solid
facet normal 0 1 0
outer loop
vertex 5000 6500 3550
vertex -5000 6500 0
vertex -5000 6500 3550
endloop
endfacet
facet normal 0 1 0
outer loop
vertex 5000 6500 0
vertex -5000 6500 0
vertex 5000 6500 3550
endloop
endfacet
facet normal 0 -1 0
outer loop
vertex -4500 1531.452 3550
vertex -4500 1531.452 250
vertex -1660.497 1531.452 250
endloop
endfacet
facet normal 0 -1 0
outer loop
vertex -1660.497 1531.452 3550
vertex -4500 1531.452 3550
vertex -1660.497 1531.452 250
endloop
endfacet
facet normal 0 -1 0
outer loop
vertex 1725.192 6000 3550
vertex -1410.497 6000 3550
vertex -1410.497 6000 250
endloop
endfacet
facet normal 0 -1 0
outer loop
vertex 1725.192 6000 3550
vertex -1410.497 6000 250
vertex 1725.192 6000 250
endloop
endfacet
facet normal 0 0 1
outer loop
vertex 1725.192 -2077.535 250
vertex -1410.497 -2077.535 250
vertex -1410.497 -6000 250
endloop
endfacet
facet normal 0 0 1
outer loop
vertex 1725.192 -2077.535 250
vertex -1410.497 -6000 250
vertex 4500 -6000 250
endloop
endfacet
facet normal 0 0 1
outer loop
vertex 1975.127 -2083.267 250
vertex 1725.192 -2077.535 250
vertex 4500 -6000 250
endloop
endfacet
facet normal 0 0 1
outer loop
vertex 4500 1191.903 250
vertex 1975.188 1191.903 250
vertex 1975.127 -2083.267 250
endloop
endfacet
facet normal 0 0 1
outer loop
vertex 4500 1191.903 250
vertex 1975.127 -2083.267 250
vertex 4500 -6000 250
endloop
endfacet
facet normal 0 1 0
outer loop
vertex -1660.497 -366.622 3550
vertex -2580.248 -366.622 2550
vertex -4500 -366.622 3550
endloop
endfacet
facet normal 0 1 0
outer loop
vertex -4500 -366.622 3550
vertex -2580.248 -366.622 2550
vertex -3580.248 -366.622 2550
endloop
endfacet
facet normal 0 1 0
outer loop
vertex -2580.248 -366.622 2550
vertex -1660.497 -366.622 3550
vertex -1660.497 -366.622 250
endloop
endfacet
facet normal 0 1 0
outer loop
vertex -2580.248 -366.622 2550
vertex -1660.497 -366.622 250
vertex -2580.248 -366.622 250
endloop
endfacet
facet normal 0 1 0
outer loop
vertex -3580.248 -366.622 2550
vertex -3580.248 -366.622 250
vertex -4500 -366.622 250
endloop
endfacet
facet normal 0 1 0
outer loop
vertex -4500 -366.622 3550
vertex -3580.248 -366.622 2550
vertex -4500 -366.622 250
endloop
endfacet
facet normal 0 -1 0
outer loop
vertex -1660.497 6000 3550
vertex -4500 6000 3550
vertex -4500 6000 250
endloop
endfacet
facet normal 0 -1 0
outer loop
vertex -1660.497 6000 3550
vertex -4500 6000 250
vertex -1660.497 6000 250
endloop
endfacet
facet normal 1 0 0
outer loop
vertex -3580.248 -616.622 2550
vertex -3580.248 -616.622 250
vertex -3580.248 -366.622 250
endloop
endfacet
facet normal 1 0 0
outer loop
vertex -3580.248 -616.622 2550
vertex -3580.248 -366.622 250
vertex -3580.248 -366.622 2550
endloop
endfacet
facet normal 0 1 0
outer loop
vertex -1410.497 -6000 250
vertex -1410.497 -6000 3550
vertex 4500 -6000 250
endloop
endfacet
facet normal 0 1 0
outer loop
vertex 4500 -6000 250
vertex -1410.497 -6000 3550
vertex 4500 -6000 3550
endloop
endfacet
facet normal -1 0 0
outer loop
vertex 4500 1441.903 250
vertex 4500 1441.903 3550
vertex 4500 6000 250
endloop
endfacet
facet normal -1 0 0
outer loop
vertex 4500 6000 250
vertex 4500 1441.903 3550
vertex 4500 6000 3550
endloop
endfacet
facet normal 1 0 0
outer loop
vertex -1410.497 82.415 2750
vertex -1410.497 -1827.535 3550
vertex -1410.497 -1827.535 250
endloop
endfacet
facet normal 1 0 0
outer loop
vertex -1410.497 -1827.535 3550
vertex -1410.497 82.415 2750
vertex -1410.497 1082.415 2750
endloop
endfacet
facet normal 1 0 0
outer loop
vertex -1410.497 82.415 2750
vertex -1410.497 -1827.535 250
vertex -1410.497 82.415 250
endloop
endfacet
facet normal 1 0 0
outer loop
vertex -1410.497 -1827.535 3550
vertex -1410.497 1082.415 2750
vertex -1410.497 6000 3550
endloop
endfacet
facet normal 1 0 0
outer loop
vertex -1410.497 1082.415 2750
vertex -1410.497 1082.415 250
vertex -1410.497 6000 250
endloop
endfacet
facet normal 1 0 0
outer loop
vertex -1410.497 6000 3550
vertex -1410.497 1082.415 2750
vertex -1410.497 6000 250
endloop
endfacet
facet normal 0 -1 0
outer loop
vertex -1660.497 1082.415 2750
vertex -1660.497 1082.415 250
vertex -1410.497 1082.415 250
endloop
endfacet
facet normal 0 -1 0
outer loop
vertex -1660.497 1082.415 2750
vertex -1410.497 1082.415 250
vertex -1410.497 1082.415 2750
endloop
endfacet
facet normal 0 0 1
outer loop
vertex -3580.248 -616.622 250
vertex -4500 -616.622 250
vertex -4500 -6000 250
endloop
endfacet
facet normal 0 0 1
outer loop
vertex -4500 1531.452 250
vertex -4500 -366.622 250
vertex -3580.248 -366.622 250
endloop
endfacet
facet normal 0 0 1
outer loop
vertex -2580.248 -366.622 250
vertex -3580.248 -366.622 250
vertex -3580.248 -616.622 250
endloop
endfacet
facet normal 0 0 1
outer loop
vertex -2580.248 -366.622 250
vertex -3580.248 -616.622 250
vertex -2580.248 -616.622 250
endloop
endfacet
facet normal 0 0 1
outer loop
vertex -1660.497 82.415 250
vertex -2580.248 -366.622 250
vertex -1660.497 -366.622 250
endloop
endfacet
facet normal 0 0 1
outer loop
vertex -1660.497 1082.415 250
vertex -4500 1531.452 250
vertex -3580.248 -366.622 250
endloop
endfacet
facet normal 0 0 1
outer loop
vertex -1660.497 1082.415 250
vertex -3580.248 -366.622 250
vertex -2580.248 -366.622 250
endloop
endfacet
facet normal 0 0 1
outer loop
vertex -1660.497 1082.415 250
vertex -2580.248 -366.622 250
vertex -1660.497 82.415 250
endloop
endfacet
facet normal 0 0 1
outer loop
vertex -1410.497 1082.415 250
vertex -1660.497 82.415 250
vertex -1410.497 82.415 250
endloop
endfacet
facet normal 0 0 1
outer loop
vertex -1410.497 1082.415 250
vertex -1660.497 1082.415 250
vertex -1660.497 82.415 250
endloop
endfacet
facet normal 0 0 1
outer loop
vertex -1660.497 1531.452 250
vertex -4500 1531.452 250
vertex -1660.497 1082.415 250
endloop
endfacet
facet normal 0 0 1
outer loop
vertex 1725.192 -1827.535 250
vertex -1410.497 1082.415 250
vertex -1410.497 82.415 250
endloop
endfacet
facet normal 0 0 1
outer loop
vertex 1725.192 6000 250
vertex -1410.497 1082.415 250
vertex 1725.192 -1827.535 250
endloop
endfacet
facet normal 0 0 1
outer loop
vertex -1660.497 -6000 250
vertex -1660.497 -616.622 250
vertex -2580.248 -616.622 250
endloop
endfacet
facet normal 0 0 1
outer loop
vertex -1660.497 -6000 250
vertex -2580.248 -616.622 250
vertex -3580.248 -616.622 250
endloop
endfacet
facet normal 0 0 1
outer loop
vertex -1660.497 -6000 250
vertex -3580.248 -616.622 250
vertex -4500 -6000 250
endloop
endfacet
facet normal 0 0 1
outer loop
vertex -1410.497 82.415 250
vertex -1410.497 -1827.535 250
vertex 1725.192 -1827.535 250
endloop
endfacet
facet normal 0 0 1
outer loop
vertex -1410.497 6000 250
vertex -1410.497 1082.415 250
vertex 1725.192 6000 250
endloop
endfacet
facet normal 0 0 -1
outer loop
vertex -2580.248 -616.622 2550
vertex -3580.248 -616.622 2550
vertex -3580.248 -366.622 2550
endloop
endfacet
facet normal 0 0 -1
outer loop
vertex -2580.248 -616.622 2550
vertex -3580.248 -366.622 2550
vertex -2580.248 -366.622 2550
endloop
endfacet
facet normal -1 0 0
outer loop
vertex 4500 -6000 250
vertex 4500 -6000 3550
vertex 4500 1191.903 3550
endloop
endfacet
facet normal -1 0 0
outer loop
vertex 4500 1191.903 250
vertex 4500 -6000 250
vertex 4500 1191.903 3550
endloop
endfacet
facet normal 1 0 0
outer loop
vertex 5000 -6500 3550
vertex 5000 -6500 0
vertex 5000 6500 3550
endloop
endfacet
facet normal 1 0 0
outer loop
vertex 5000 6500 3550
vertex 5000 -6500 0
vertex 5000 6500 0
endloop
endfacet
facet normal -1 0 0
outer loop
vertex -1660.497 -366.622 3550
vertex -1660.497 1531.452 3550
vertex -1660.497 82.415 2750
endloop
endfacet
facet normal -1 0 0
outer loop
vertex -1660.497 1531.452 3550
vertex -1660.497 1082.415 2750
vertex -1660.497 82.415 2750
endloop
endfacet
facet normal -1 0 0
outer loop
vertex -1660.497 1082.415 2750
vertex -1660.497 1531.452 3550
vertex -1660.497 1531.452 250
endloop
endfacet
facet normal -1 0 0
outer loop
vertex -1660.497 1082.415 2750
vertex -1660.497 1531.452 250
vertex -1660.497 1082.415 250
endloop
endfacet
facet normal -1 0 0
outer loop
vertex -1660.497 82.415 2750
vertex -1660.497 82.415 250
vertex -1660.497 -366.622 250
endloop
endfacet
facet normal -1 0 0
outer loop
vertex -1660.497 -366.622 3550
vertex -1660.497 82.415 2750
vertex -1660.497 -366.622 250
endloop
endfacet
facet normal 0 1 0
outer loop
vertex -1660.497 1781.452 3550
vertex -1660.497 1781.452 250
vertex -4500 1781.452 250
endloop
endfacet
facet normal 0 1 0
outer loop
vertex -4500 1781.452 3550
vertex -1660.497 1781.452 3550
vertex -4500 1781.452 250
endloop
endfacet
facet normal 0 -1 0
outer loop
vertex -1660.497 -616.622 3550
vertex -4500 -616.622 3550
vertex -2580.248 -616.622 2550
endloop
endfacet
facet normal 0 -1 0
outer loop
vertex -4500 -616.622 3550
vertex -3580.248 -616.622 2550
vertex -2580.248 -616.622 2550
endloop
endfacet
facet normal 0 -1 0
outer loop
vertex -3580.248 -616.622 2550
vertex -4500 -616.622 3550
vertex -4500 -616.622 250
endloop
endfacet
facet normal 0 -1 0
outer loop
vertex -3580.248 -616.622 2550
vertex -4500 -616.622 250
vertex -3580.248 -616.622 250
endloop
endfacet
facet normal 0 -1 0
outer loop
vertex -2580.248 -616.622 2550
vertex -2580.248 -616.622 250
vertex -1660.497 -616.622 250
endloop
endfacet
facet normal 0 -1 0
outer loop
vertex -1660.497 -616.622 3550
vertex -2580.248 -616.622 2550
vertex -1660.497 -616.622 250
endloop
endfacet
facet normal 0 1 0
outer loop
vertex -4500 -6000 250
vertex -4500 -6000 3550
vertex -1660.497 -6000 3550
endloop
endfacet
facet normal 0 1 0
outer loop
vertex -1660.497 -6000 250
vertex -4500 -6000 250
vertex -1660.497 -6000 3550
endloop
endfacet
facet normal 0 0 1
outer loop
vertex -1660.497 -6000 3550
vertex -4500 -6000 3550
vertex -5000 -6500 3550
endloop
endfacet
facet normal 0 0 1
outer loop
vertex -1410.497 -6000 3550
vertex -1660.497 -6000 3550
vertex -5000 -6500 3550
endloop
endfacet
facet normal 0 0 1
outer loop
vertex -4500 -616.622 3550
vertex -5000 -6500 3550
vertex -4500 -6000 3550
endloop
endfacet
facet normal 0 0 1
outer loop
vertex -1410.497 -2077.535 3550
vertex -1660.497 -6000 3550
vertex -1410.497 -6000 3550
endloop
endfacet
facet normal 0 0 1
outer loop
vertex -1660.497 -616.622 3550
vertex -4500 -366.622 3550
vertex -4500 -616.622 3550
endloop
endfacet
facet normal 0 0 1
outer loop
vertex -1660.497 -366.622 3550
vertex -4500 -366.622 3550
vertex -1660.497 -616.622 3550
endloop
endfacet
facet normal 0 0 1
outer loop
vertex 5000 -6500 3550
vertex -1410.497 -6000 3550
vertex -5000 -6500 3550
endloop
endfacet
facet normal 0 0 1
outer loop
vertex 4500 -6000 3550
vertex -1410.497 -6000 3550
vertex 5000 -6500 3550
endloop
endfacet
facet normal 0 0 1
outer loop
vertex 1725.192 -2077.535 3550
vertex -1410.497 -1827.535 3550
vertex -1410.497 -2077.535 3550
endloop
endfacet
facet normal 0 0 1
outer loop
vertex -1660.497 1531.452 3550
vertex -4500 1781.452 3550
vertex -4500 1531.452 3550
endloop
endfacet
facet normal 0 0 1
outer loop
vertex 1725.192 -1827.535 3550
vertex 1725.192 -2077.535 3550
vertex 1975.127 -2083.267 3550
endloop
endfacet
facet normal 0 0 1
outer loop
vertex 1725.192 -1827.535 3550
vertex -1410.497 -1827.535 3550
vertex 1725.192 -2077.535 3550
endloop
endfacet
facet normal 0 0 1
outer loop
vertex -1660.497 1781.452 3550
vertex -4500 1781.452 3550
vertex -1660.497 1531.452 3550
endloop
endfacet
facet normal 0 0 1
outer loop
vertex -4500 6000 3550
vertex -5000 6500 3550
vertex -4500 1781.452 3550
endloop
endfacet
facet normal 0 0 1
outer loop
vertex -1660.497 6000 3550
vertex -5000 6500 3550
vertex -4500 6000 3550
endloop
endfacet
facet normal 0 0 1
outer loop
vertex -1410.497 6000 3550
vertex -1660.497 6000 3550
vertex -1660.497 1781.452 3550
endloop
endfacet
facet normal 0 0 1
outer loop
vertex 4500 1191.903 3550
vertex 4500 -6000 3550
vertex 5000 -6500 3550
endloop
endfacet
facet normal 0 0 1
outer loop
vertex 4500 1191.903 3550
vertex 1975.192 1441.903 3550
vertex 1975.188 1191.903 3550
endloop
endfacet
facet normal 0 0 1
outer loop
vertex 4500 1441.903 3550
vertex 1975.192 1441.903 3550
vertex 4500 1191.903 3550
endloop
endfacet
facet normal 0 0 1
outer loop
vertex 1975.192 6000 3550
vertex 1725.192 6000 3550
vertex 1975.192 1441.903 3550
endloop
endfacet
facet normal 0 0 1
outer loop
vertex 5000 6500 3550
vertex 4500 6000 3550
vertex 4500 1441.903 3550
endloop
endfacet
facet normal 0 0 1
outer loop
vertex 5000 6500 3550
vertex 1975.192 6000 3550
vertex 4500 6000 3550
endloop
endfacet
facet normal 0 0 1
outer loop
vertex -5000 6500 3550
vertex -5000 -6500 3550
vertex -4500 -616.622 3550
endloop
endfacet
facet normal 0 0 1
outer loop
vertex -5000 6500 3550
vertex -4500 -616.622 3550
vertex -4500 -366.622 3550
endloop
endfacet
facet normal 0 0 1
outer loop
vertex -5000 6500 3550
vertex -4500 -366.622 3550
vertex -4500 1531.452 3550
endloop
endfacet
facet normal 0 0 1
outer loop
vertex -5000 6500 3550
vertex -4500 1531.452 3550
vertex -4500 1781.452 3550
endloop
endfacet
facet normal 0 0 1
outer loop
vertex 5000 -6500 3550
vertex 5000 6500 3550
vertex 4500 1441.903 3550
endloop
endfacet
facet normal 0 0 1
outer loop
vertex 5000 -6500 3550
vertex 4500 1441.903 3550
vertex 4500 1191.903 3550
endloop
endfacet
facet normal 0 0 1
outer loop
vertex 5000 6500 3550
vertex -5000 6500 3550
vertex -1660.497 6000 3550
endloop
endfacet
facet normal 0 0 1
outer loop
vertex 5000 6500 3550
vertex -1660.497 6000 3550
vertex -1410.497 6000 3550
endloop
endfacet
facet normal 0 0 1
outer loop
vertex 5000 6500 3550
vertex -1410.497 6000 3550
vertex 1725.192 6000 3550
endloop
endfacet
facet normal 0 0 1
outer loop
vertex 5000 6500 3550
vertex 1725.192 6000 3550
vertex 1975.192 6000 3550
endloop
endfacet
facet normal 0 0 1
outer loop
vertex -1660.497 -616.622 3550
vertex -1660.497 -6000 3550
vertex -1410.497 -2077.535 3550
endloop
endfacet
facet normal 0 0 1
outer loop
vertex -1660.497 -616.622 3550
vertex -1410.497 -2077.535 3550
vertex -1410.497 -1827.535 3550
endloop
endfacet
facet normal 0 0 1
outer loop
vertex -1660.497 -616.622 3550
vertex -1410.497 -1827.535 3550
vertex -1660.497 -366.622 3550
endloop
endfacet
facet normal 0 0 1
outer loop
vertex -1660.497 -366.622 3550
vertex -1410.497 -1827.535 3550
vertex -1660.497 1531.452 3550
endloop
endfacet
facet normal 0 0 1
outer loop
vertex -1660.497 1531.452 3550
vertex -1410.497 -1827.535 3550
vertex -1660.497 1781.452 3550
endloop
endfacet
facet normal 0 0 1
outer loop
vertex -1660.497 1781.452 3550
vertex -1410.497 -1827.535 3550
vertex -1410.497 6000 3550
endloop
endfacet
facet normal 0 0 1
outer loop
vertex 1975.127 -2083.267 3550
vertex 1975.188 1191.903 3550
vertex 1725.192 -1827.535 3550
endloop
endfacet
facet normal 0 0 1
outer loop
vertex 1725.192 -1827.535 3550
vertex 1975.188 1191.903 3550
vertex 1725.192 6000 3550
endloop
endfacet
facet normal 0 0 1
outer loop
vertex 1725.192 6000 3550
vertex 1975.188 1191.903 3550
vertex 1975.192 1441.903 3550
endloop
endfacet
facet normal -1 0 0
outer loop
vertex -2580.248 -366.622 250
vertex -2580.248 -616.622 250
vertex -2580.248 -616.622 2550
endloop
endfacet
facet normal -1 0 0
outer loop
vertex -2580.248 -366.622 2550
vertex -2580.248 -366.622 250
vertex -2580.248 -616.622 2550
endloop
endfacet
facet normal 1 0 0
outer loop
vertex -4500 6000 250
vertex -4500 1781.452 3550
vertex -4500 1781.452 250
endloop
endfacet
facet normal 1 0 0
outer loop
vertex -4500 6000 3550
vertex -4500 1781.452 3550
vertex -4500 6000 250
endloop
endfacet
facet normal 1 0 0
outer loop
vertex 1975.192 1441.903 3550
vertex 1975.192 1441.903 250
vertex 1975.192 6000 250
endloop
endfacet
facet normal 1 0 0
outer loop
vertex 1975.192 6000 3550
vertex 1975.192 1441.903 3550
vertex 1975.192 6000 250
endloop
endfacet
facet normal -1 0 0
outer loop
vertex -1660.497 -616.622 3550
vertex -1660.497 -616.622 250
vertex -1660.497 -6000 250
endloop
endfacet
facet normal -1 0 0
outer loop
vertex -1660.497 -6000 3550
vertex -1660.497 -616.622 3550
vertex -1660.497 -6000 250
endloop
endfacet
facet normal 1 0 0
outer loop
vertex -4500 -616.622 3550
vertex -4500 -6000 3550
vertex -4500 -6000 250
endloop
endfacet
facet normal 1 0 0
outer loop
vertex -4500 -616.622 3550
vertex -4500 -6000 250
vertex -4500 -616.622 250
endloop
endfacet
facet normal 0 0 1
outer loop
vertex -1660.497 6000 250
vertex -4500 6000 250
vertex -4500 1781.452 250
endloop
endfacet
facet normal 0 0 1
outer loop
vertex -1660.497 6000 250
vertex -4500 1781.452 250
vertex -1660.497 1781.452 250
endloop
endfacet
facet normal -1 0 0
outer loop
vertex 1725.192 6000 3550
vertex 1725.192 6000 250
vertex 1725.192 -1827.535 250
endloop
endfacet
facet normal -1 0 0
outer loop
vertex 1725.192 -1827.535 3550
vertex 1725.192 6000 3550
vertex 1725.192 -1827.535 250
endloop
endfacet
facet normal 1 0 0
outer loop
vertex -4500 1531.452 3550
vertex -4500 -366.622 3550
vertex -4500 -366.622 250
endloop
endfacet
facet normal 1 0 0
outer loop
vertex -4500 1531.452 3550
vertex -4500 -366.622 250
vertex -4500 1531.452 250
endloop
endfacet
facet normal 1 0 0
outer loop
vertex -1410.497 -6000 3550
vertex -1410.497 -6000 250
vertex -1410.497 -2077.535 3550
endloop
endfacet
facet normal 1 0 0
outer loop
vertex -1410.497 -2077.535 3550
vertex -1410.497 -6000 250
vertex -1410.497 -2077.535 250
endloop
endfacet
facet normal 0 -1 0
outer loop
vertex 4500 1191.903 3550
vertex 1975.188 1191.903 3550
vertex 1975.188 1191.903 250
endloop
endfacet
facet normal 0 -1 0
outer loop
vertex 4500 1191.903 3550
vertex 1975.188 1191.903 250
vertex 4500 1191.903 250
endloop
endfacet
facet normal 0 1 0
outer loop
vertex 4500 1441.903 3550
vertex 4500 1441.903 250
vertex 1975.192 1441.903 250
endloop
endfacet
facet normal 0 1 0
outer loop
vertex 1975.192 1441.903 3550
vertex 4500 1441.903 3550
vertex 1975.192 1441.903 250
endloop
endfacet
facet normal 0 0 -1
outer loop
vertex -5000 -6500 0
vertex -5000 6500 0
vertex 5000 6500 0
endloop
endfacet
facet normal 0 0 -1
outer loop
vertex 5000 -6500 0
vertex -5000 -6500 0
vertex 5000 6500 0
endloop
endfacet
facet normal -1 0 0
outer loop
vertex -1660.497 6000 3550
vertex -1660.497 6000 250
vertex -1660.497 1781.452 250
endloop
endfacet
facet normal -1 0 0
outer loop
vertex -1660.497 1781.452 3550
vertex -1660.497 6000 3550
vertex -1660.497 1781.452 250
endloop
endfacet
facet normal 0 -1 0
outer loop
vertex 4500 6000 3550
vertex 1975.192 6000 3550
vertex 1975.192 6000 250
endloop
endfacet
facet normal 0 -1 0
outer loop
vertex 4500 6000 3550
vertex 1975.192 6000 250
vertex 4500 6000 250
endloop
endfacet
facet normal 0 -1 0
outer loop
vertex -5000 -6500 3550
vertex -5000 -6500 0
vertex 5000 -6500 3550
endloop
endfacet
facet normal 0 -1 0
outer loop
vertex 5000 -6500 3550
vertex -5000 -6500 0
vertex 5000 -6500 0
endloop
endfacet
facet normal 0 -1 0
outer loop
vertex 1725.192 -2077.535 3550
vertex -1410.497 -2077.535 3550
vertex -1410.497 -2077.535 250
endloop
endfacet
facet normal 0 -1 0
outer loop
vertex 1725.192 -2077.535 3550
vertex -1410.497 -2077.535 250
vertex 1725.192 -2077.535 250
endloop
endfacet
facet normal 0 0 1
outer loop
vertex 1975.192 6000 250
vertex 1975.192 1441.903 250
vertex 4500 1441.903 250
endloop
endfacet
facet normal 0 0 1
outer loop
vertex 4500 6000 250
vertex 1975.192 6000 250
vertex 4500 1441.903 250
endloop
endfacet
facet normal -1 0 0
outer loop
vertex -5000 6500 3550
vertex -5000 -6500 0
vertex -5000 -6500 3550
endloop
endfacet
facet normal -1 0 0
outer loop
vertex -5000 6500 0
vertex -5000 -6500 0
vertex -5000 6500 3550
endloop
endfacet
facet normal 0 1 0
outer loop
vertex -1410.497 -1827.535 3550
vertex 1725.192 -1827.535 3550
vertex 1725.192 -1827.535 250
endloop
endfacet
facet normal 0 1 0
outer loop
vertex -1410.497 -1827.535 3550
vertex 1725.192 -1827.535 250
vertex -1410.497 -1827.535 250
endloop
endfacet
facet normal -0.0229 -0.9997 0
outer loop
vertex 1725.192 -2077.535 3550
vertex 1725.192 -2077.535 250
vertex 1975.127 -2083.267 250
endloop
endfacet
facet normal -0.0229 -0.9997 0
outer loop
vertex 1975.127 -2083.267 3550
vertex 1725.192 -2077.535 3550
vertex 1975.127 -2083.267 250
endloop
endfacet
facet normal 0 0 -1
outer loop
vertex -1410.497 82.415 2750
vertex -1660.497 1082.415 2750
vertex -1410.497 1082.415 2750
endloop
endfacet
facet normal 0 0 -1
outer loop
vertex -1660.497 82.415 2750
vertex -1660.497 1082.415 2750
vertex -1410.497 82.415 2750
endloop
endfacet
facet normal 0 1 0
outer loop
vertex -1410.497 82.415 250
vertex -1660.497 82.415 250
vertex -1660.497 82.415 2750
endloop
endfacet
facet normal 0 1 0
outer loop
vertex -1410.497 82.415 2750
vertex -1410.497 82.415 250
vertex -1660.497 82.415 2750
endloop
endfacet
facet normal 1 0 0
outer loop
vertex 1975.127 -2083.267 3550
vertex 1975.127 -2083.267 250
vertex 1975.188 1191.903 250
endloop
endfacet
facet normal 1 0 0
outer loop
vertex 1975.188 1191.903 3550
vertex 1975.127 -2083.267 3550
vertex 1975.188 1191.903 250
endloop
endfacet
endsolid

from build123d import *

# Parameters (mm, degrees)
F0_W     = 10000
F0_H     = 13000
F1_DEPTH = 3550
F2_W     = 9000
F2_H     = 12000
F3_DEPTH = 3300
F5_DEPTH = 3300
F6_W     = 1000
F6_H     = 2300
F7_DEPTH = 250
F8_W     = 1000
F8_H     = 2500
F9_DEPTH = 250


# Not quite as in the source:
# - a feature names something its author has since deleted; it is built from what else it names


with BuildPart() as f1:
    # F0 (on Top) → F1 (new body)
    with BuildSketch(Plane.XY):
        Rectangle(F0_W, F0_H)
    extrude(amount=F1_DEPTH)

    # F2 (on face) → F3 (cut)
    with BuildSketch(Plane.XY.offset(3550)):
        Rectangle(F2_W, F2_H)
    extrude(amount=-F3_DEPTH, mode=Mode.SUBTRACT)

    # F4 (on face) → F5 (join)
    with BuildSketch(Plane.XY.offset(250)):
        Polygon((-1660.4968309402, -366.6217029095), (-4500, -366.6217029095), (-4500, -616.6217029095), (-1660.4968309402, -616.6217029095), (-1660.4968309402, -6000), (-1410.4968309402, -6000), (-1410.4968309402, -2077.5351682588), (1725.1923292822, -2077.5351682588), (1975.1266148544, -2083.2669128011), (1975.1876689086, 1191.9026374817), (4500, 1191.9026374817), (4500, 1441.9026374817), (1975.1923292822, 1441.9026374817), (1975.1923292822, 6000), (1725.1923292822, 6000), (1725.1923292822, 1441.9026374817), (1725.1923292822, -1827.5351682588), (-1410.4968309402, -1827.5351682588), (-1410.4968309402, 6000), (-1660.4968309402, 6000), (-1660.4968309402, 1781.4515829086), (-4500, 1781.4515829086), (-4500, 1531.4515829086), (-1660.4968309402, 1531.4515829086), align=None)
    extrude(amount=F5_DEPTH)

    # F6 (on face) → F7 (cut)
    with BuildSketch(Plane.XZ.offset(616.6217029095)):
        with Locations((-3080.2484154701, 1400)):
            Rectangle(F6_W, F6_H)
    extrude(amount=-F7_DEPTH, mode=Mode.SUBTRACT)

    # F8 (on face) → F9 (cut, through all)
    with BuildSketch(Plane(origin=(-1660.4968309402, 0, 0), x_dir=(0, -1, 0), z_dir=(-1, 0, 0))):
        with Locations((-582.4149399996, 1500)):
            Rectangle(F8_W, F8_H)
    extrude(amount=-F9_DEPTH, mode=Mode.SUBTRACT)


solid = f1.part
